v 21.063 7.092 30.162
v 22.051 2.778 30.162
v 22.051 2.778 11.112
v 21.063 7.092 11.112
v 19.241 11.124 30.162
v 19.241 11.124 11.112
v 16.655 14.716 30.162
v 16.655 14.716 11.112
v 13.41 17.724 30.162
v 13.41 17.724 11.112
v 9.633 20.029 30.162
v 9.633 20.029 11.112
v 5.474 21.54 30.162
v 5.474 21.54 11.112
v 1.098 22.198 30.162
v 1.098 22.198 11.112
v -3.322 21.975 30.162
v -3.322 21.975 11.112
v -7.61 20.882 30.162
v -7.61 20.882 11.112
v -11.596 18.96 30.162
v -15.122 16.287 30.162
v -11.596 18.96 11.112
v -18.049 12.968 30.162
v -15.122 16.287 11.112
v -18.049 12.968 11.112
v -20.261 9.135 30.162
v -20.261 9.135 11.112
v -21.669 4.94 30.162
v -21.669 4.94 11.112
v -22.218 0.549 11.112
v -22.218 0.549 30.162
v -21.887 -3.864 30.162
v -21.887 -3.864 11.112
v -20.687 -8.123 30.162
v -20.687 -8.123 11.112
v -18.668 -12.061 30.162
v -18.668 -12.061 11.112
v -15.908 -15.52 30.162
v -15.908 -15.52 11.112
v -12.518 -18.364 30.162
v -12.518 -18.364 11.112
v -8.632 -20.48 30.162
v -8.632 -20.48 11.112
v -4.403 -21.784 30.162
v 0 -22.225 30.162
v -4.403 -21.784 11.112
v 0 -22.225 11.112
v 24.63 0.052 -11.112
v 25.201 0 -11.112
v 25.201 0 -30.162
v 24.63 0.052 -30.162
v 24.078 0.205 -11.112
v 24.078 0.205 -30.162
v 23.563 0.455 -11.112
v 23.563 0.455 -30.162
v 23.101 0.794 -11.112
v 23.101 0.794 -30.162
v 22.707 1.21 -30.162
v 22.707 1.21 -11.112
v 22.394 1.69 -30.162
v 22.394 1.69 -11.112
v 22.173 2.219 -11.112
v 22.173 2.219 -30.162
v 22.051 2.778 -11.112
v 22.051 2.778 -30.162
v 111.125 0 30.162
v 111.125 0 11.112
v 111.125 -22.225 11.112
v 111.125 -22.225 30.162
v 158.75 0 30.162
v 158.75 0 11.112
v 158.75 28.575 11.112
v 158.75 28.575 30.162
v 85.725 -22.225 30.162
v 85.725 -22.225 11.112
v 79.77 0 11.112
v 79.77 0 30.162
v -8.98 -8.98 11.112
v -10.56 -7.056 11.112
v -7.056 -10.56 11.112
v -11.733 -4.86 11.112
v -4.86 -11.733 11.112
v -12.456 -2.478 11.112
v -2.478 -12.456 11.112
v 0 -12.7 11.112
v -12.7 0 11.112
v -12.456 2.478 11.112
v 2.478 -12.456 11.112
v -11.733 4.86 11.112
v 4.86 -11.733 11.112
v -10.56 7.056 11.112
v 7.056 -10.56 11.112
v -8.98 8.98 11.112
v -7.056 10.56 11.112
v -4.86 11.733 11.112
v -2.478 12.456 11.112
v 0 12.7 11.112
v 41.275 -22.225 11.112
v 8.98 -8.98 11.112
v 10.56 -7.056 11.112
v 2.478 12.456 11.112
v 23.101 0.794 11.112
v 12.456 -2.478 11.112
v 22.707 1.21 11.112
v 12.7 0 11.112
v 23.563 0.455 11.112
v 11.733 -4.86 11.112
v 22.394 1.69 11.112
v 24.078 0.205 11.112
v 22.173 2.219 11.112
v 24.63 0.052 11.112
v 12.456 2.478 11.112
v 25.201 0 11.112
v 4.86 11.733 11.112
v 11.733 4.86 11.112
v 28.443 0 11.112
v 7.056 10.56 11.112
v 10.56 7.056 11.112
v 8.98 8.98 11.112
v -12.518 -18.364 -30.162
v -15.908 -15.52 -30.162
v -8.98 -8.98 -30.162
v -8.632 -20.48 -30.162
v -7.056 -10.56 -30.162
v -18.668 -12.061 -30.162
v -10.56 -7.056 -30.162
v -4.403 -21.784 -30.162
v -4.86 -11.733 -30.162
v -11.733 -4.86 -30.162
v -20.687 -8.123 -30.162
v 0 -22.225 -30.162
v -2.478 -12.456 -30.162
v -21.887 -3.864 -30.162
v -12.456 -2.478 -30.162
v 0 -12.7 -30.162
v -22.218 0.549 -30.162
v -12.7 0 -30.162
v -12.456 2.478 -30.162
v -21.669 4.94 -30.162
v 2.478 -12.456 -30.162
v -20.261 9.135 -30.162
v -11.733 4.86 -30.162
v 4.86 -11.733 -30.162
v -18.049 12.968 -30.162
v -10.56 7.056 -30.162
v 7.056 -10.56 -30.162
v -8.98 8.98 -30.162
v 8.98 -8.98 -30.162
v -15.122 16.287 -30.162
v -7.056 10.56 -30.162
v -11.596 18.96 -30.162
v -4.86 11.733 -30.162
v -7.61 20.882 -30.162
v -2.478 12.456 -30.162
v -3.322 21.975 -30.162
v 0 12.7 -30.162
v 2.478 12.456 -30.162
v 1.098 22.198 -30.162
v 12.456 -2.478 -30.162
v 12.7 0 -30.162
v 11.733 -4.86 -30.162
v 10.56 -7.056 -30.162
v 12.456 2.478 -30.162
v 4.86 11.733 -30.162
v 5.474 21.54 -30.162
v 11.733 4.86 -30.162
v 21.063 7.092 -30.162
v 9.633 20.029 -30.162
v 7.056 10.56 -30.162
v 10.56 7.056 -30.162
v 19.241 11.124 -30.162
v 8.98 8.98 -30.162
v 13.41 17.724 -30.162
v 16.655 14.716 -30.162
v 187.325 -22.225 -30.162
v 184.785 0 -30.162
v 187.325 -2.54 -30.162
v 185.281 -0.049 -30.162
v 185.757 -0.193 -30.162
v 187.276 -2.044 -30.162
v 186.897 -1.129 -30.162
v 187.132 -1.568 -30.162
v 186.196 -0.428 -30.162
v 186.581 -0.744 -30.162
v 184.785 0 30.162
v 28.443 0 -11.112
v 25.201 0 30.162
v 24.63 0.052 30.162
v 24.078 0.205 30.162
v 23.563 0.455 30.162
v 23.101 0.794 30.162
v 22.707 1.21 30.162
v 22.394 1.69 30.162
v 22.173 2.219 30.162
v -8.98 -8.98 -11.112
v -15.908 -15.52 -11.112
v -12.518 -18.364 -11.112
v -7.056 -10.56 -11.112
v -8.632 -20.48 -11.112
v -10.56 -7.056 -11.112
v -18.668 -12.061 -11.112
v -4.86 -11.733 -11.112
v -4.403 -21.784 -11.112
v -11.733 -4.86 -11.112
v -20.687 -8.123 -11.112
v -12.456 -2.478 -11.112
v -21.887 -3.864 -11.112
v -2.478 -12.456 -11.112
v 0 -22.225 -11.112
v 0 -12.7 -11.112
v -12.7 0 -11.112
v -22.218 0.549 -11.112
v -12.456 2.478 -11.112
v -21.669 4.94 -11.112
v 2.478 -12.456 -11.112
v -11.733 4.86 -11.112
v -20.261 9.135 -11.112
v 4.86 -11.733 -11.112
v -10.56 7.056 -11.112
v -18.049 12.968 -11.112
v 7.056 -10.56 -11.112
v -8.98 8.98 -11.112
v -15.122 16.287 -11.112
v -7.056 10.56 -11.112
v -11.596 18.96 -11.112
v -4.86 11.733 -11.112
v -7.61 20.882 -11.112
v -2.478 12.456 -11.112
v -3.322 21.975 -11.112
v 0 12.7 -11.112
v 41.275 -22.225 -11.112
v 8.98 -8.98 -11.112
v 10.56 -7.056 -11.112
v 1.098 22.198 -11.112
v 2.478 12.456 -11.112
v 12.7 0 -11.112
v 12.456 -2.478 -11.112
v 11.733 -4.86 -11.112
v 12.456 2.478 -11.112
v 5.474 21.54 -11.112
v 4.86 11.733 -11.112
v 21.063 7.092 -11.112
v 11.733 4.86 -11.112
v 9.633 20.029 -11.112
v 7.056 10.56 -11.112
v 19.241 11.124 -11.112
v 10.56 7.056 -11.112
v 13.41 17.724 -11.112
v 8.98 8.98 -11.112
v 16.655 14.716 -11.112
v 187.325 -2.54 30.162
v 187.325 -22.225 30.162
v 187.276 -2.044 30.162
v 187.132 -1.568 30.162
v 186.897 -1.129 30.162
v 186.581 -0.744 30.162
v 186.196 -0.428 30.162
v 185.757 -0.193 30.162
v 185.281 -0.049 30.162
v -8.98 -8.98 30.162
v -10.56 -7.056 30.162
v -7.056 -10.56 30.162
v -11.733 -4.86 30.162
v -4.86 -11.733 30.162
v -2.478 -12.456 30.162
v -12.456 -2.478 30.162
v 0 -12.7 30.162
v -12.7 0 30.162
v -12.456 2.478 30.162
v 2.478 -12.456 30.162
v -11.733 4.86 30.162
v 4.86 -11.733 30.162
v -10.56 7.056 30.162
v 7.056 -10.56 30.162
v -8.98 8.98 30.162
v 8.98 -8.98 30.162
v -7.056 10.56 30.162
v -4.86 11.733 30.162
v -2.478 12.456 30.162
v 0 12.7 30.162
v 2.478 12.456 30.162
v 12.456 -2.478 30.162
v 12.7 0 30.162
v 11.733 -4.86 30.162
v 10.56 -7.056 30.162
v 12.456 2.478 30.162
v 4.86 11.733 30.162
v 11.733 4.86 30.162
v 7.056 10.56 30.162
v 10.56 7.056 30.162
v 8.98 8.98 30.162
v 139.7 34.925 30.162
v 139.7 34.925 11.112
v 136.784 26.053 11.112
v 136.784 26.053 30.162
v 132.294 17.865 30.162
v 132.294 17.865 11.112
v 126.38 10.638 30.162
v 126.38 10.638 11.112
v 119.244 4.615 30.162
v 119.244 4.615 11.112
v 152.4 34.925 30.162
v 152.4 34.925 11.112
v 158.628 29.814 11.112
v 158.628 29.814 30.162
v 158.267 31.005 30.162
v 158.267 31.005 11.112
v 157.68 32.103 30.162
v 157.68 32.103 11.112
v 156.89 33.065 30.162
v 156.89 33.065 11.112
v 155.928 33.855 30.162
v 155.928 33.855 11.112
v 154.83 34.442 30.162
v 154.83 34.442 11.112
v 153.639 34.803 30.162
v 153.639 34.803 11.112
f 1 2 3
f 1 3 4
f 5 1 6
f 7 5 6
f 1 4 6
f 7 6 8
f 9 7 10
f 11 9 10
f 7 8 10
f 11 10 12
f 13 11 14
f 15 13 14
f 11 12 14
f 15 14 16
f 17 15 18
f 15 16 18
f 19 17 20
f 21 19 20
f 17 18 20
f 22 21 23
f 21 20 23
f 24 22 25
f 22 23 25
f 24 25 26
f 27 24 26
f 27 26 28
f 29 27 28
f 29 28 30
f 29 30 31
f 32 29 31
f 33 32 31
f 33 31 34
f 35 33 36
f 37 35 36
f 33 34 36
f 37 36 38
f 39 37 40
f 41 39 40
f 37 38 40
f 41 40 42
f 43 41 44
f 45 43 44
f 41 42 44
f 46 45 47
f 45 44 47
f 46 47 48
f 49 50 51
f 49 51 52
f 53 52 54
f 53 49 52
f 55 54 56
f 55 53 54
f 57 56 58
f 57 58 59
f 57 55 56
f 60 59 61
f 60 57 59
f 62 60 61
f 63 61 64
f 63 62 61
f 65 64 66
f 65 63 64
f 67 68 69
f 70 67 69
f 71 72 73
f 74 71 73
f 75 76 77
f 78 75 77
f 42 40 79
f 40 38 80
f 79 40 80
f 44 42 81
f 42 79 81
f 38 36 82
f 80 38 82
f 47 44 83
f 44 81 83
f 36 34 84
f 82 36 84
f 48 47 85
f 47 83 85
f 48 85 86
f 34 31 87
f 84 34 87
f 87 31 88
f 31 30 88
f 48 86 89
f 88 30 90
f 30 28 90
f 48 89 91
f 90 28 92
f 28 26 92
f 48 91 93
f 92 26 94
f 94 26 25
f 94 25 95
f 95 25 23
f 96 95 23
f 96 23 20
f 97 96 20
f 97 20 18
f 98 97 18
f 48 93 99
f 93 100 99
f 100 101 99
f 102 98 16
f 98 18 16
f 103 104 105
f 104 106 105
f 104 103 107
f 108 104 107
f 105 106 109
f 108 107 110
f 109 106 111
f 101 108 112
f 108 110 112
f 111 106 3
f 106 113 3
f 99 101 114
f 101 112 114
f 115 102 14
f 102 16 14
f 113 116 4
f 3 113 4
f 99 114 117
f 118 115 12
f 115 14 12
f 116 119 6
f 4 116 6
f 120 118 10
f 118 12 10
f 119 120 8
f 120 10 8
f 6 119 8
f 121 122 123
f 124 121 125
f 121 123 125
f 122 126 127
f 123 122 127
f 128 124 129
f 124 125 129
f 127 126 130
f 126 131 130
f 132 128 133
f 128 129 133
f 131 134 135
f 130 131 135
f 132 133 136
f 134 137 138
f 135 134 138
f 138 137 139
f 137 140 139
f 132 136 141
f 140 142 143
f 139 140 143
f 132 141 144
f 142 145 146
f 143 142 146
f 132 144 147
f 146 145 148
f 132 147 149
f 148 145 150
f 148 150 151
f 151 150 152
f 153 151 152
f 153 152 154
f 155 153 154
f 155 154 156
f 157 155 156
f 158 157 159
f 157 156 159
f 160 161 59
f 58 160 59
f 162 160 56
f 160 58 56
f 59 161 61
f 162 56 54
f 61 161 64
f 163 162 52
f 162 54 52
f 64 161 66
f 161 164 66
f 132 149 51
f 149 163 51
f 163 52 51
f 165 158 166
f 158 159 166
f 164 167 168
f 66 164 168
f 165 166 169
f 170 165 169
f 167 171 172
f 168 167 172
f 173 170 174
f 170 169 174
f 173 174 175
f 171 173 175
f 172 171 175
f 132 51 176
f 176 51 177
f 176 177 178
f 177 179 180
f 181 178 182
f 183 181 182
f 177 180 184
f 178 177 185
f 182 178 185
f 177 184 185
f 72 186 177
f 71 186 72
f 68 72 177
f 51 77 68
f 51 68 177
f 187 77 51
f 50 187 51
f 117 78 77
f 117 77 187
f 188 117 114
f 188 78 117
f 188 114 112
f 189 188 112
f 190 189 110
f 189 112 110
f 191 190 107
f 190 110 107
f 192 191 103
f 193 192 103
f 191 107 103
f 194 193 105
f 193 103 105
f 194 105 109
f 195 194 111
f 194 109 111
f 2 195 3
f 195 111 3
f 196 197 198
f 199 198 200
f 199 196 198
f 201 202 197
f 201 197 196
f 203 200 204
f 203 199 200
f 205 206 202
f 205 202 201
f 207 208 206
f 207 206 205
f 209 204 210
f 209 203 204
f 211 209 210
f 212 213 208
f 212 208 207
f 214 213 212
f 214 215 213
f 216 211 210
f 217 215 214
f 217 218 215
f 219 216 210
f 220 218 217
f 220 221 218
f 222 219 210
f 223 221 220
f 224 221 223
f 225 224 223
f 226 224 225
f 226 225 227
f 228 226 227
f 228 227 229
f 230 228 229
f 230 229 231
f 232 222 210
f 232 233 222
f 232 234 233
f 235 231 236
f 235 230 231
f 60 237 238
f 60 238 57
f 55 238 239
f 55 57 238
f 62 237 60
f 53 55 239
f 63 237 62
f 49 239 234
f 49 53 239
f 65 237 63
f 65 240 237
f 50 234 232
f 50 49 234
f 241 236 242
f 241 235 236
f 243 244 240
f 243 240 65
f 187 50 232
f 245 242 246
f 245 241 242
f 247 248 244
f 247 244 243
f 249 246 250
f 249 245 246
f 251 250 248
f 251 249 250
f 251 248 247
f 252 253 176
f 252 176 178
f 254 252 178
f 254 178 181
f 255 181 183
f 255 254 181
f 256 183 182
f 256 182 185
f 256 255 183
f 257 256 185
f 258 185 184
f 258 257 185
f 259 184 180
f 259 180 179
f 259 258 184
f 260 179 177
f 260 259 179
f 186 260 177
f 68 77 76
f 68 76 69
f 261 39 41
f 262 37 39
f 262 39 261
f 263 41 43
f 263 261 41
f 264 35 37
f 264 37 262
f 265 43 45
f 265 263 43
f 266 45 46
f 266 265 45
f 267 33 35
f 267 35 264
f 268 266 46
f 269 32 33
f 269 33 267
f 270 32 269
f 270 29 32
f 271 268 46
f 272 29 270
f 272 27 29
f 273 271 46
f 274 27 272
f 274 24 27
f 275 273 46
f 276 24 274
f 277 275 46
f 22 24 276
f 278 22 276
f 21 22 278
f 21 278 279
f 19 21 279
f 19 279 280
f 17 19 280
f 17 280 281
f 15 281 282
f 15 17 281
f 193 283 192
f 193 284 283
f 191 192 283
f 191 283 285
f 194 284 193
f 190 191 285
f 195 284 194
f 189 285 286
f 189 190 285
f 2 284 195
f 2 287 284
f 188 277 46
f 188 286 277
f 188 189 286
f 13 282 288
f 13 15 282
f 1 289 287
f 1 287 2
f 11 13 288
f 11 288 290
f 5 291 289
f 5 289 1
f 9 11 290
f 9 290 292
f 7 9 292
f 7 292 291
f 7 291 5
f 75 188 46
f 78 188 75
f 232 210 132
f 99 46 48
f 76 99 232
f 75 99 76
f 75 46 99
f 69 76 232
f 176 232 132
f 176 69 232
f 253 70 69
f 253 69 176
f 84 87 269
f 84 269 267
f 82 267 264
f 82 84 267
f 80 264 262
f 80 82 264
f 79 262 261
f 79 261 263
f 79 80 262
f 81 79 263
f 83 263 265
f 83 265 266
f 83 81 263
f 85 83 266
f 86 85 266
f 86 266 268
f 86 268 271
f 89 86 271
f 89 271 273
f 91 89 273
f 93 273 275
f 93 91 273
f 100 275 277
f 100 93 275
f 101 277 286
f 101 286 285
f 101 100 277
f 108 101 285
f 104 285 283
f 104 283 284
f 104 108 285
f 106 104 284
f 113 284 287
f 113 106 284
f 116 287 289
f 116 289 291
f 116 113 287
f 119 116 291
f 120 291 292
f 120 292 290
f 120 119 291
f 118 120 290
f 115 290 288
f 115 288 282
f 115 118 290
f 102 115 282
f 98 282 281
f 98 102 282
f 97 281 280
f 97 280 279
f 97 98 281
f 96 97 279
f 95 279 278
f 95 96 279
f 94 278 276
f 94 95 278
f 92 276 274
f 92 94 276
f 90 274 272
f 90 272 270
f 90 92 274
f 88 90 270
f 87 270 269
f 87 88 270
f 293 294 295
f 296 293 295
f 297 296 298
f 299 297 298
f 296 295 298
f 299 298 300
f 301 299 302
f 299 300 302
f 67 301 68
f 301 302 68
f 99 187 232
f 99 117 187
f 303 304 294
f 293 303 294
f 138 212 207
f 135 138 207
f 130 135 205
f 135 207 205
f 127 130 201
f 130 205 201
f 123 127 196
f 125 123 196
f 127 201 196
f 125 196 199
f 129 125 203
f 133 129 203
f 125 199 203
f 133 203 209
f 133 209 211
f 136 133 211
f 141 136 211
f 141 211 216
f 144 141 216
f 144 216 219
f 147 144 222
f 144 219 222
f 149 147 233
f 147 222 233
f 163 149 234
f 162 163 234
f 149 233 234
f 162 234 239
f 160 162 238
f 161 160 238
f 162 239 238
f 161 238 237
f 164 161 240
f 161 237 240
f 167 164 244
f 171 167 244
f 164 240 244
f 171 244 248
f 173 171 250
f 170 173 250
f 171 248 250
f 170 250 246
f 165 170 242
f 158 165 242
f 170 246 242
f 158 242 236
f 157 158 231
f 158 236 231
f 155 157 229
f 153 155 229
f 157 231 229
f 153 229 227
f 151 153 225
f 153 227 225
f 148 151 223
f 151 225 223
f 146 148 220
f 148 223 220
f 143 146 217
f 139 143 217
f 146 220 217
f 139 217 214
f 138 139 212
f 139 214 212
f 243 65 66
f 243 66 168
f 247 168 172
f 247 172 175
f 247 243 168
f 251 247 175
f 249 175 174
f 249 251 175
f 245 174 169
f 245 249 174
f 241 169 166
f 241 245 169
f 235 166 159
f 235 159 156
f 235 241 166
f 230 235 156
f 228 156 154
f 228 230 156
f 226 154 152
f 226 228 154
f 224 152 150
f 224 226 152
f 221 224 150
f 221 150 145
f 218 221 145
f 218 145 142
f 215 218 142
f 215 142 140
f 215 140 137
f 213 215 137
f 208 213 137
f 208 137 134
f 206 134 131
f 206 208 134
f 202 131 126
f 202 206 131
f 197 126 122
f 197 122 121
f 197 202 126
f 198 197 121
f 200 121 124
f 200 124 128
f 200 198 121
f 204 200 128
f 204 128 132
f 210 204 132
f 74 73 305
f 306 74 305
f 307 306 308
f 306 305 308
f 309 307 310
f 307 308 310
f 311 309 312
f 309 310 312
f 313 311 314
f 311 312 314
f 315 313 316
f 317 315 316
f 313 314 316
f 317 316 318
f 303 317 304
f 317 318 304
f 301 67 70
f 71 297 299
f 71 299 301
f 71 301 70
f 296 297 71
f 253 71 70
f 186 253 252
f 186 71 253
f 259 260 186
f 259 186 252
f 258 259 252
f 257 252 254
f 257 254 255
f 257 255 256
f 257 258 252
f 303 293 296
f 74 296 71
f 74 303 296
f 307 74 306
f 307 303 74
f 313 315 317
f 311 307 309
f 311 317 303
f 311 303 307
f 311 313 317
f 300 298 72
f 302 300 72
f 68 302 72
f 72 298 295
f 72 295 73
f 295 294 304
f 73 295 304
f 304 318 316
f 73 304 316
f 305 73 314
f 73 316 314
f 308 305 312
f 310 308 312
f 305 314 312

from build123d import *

# Parameters (mm, degrees)
BOSS_EXTRUDE1_DEPTH = 11.1125
BOSS_EXTRUDE2_START = 11.1125
SKETCH1_4_R         = 12.7
BOSS_EXTRUDE2_DEPTH = 19.05
BOSS_EXTRUDE4_START = -11.1125
SKETCH1_6_R         = 22.225
SKETCH1_6_R_2       = 12.7
BOSS_EXTRUDE4_DEPTH = 19.05


with BuildPart() as part:
    # Sketch1 → Boss-Extrude1 (new, symmetric)
    with BuildSketch(Plane.XY):
        with BuildLine():
            Line((28.443390267, 0), (41.275, -22.225))
            Line((41.275, -22.225), (187.325, -22.225))
            Line((187.325, -22.225), (187.325, -2.54))
            ThreePointArc((187.325, -2.54), (186.581051224, -0.743948776), (184.785, 0))
            Line((184.785, 0), (28.443390267, 0))
        make_face()
    extrude(amount=BOSS_EXTRUDE1_DEPTH, both=True)

    # Sketch1<4> → Boss-Extrude2 (add)
    with BuildSketch(Plane.XY.offset(BOSS_EXTRUDE2_START)):
        with BuildLine():
            ThreePointArc((25.200781238, 0), (23.100716135, 0.79375), (22.050683583, 2.778125))
            ThreePointArc((22.050683583, 2.778125), (-16.66875, 14.700455722), (0, -22.225))
            Line((0, -22.225), (85.725, -22.225))
            Line((85.725, -22.225), (79.769829198, 0))
            Line((79.769829198, 0), (25.200781238, 0))
        make_face()
        with Locations(Location((0, 0, 0), (0, 0, 180))):
            Circle(SKETCH1_4_R, mode=Mode.SUBTRACT)
        with BuildLine():
            Line((111.125, 0), (111.125, -22.225))
            Line((111.125, -22.225), (187.325, -22.225))
            Line((187.325, -22.225), (187.325, -2.54))
            ThreePointArc((187.325, -2.54), (186.581051224, -0.743948776), (184.785, 0))
            Line((184.785, 0), (158.75, 0))
            Line((158.75, 0), (158.75, 28.575))
            ThreePointArc((158.75, 28.575), (156.890128061, 33.065128061), (152.4, 34.925))
            Line((152.4, 34.925), (139.7, 34.925))
            ThreePointArc((139.7, 34.925), (129.503262126, 14.115512806), (111.125, 0))
        make_face()
    extrude(amount=BOSS_EXTRUDE2_DEPTH)

    # Sketch1<6> → Boss-Extrude4 (add)
    with BuildSketch(Plane.XY.offset(BOSS_EXTRUDE4_START)):
        Circle(SKETCH1_6_R)
        with Locations(Location((0, 0, 0), (0, 0, 180))):
            Circle(SKETCH1_6_R_2, mode=Mode.SUBTRACT)
        with BuildLine():
            ThreePointArc((22.225, 0), (15.715448212, -15.715448212), (0, -22.225))
            Line((0, -22.225), (41.275, -22.225))
            Line((41.275, -22.225), (28.443390267, 0))
            Line((28.443390267, 0), (25.200781238, 0))
            ThreePointArc((25.200781238, 0), (23.100716135, 0.79375), (22.050683583, 2.778125))
            ThreePointArc((22.050683583, 2.778125), (22.181378087, 1.391794231), (22.225, 0))
        make_face()
        Polygon((28.443390267, 0), (41.275, -22.225), (85.725, -22.225), (79.769829198, 0), align=None)
        with BuildLine():
            Line((187.325, -22.225), (187.325, -2.54))
            ThreePointArc((187.325, -2.54), (186.581051224, -0.743948776), (184.785, 0))
            Line((184.785, 0), (158.75, 0))
            Line((158.75, 0), (111.125, 0))
            Line((111.125, 0), (111.125, -22.225))
            Line((111.125, -22.225), (187.325, -22.225))
        make_face()
        Polygon((85.725, -22.225), (79.769829198, 0), (111.125, 0), (111.125, -22.225), align=None)
    extrude(amount=-BOSS_EXTRUDE4_DEPTH)


solid = part.part
